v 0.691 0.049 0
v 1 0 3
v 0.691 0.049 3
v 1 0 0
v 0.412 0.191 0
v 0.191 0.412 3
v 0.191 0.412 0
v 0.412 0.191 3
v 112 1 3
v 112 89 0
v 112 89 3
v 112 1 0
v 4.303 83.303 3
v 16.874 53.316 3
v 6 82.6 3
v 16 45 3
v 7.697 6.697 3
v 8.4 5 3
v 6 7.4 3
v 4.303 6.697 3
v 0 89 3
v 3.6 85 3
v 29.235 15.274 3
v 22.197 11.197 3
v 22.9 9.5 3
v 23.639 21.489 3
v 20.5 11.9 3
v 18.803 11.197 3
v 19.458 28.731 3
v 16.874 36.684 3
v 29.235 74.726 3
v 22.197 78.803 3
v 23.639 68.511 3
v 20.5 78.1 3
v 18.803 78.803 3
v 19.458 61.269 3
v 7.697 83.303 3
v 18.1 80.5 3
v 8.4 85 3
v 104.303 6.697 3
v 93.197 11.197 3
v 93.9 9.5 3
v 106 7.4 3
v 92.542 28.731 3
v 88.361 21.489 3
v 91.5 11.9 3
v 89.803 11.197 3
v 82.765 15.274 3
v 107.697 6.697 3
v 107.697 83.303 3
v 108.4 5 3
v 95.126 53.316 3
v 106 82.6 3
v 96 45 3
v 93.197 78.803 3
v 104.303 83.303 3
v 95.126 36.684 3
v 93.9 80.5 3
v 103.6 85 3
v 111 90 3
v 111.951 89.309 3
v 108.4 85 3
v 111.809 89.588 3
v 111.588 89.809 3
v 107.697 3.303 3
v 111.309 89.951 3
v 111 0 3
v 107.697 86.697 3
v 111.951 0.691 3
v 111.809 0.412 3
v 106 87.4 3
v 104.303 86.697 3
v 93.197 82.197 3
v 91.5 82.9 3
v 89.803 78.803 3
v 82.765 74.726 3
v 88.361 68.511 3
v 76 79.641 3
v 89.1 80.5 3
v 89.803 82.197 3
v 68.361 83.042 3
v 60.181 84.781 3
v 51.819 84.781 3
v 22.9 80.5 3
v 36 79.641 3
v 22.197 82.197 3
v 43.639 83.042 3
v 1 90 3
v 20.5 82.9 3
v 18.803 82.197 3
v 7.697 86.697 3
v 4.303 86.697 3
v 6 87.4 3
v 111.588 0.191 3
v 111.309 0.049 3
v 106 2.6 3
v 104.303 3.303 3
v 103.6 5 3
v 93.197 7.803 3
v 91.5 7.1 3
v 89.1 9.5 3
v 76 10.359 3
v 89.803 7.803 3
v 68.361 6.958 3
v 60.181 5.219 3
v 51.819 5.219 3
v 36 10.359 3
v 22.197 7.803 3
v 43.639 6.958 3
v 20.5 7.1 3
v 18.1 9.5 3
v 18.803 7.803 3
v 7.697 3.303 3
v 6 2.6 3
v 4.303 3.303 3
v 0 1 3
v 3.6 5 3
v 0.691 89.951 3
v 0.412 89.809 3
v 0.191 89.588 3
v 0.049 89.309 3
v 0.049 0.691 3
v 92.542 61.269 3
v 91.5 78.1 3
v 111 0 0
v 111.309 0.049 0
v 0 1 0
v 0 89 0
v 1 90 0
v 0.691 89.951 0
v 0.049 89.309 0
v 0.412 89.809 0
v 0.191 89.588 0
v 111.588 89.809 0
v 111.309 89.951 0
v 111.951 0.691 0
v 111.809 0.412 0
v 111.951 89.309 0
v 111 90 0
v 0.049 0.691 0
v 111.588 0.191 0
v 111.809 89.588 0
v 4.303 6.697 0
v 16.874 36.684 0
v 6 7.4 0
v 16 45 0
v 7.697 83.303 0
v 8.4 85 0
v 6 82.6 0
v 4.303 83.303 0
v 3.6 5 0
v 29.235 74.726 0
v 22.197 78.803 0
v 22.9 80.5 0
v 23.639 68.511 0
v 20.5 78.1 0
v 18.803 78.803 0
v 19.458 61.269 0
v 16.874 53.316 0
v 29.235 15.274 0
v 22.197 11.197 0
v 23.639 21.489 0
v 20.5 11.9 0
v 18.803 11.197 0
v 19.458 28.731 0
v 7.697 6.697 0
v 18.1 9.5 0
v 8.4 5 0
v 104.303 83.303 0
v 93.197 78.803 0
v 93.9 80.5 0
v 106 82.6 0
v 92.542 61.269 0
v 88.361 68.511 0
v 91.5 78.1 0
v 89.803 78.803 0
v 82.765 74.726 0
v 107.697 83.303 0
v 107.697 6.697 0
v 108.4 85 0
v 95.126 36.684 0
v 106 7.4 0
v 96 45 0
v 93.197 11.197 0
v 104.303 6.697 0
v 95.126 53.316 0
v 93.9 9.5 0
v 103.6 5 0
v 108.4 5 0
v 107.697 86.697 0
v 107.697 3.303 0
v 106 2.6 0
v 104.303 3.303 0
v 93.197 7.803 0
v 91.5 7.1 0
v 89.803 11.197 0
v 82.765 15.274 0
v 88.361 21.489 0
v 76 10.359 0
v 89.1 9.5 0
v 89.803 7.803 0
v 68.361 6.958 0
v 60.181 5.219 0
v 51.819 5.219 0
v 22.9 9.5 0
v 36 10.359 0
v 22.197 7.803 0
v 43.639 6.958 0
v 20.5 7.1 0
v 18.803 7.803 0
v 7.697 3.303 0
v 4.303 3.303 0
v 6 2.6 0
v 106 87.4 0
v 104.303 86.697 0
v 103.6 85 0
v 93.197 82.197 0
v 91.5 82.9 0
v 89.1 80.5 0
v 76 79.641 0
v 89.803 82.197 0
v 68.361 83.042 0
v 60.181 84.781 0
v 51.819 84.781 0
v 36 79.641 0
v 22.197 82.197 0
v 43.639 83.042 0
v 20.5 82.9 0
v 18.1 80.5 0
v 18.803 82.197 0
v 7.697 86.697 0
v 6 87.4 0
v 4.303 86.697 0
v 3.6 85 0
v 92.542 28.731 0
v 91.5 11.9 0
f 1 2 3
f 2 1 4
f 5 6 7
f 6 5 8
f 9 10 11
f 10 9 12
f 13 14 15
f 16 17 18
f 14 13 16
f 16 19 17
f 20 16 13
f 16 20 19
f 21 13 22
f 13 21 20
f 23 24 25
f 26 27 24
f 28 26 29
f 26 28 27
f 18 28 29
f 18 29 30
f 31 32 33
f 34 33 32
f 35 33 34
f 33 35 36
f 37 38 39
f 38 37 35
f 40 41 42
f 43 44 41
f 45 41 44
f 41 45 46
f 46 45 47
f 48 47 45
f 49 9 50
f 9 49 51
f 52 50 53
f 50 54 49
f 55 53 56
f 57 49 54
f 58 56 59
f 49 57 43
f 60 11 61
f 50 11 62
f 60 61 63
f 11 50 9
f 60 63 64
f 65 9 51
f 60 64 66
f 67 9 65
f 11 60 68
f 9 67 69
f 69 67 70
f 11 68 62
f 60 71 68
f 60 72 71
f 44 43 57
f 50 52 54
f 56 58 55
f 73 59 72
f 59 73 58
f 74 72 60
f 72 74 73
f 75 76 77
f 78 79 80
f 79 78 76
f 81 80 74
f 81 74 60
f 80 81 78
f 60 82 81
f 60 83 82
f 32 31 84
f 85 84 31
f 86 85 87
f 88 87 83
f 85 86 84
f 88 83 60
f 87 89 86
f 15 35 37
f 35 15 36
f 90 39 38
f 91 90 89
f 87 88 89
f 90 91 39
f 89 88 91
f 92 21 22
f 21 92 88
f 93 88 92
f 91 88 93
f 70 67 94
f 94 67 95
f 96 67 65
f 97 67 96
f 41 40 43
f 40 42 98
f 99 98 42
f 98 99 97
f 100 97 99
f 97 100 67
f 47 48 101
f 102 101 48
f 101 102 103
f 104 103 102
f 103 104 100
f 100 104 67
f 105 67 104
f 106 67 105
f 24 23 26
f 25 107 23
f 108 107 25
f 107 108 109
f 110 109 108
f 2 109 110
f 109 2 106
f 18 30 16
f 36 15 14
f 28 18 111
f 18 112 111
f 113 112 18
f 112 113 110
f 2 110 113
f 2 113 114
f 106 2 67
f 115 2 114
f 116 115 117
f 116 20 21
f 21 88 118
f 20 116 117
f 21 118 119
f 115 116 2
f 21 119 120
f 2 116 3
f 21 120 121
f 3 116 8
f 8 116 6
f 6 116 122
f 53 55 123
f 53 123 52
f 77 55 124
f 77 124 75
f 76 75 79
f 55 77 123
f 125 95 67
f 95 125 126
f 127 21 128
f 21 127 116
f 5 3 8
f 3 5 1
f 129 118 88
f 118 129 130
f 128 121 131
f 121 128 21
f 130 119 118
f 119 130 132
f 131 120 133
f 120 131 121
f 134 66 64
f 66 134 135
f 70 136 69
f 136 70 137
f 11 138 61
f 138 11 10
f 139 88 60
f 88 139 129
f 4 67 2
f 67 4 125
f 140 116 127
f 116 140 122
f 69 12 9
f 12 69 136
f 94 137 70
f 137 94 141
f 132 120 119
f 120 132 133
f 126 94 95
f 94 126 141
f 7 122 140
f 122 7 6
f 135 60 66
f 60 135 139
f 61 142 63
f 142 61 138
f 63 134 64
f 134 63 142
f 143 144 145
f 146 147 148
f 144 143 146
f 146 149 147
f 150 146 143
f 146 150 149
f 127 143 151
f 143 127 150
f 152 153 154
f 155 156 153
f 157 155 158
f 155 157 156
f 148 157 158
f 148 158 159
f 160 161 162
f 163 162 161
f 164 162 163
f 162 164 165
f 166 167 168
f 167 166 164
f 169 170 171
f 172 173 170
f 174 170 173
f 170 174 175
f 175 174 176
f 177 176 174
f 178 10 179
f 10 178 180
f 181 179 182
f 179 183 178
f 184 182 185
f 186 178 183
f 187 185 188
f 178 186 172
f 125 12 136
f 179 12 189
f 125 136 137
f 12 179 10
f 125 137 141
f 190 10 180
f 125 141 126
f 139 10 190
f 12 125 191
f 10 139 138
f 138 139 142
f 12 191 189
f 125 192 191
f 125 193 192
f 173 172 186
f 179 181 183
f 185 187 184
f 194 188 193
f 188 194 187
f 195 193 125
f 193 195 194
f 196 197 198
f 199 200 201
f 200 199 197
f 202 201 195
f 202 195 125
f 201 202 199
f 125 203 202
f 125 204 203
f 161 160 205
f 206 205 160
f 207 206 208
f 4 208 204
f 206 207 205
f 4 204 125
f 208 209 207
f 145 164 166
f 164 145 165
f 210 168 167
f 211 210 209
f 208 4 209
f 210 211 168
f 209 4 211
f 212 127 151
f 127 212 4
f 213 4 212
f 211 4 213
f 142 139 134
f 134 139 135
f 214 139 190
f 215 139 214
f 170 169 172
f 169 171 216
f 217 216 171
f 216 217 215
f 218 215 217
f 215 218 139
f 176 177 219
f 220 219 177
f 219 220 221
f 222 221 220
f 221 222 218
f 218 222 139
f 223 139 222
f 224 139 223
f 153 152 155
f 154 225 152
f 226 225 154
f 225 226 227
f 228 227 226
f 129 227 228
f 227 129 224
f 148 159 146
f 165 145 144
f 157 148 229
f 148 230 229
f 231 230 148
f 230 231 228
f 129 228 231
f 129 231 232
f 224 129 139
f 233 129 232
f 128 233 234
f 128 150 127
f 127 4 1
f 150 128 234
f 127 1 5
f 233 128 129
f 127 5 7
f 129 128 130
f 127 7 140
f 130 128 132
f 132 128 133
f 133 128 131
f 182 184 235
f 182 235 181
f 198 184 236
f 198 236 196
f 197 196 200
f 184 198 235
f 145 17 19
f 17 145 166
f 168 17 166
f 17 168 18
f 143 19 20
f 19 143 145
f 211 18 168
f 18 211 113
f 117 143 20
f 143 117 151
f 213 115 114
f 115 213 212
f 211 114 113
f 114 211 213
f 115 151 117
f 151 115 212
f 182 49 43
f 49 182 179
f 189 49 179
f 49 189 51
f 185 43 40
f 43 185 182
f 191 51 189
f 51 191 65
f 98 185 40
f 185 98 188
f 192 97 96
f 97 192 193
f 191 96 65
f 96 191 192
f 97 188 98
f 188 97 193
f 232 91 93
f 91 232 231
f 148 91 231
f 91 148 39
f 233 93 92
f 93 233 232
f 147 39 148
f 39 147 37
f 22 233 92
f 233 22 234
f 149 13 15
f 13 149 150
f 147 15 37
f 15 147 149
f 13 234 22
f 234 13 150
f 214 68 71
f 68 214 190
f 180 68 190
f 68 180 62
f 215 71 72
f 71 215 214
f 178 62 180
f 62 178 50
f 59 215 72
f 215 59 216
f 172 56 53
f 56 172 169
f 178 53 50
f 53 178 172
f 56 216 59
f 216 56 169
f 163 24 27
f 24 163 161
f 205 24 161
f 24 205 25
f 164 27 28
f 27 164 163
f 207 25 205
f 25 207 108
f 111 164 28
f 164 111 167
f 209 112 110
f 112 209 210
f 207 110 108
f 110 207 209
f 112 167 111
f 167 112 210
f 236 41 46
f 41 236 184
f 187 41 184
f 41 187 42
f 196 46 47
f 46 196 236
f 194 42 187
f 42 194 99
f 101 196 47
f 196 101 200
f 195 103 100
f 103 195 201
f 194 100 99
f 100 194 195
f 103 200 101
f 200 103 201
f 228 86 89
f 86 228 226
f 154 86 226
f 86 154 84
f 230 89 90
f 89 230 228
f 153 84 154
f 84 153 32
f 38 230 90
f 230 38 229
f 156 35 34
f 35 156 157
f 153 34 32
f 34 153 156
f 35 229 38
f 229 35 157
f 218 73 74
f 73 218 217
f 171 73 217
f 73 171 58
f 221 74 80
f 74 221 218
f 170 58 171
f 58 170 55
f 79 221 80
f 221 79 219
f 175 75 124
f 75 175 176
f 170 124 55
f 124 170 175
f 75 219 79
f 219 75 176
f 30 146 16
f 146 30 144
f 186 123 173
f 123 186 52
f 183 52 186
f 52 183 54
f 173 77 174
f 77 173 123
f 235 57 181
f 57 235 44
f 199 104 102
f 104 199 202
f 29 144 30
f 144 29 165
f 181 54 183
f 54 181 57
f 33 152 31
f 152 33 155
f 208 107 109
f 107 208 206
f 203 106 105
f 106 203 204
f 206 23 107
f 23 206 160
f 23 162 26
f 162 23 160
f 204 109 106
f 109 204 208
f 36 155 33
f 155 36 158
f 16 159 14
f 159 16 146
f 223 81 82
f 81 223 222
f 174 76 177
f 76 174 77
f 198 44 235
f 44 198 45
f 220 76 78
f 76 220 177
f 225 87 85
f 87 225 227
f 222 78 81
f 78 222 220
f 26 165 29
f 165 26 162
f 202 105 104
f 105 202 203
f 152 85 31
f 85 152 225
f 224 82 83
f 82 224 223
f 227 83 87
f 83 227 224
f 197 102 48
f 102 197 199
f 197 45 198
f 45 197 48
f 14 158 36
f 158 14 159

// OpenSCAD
// file: roundedcube.scad
// Higher definition curves
$fn = 20;



module roundedcube(size = [1, 1, 1], center = false, radius = 0.5, apply_to = "all") {
	// If single value, convert to [x, y, z] vector
	size = (size[0] == undef) ? [size, size, size] : size;

	translate_min = radius;
	translate_xmax = size[0] - radius;
	translate_ymax = size[1] - radius;
	translate_zmax = size[2] - radius;

	diameter = radius * 2;

	module build_point(type = "sphere", rotate = [0, 0, 0]) {
		if (type == "sphere") {
			sphere(r = radius);
		} else if (type == "cylinder") {
			rotate(a = rotate)
			cylinder(h = diameter, r = radius, center = true);
		}
	}

	obj_translate = (center == false) ?
		[0, 0, 0] : [
			-(size[0] / 2),
			-(size[1] / 2),
			-(size[2] / 2)
		];

	translate(v = obj_translate) {
		hull() {
			for (translate_x = [translate_min, translate_xmax]) {
				x_at = (translate_x == translate_min) ? "min" : "max";
				for (translate_y = [translate_min, translate_ymax]) {
					y_at = (translate_y == translate_min) ? "min" : "max";
					for (translate_z = [translate_min, translate_zmax]) {
						z_at = (translate_z == translate_min) ? "min" : "max";

						translate(v = [translate_x, translate_y, translate_z])
						if (
							(apply_to == "all") ||
							(apply_to == "xmin" && x_at == "min") || (apply_to == "xmax" && x_at == "max") ||
							(apply_to == "ymin" && y_at == "min") || (apply_to == "ymax" && y_at == "max") ||
							(apply_to == "zmin" && z_at == "min") || (apply_to == "zmax" && z_at == "max")
						) {
							build_point("sphere");
						} else {
							rotate = 
								(apply_to == "xmin" || apply_to == "xmax" || apply_to == "x") ? [0, 90, 0] : (
								(apply_to == "ymin" || apply_to == "ymax" || apply_to == "y") ? [90, 90, 0] :
								[0, 0, 0]
							);
							build_point("cylinder", rotate);
						}
					}
				}
			}
		}
	}
}
// main file
w = 112;
h = 90;
s = 3;

use <roundedcube.scad>

hmx = 100;
hmy = 80;

fm = 71;
fmh = 80;

hr = 2.4;

difference(){
roundedcube([w,h,s],radius=1,apply_to="z_max");


dx = (w-hmx)/2;
dy = (h-hmy)/2;
translate([dx,dy,0])cylinder(s,hr,hr);
translate([w-dx,dy,0])cylinder(s,hr,hr);
translate([dx,h-dy,0])cylinder(s,hr,hr);
translate([w-dx,h-dy,0])cylinder(s,hr,hr);
    
dfx = (w-fm)/2;
dfy = (h-fm)/2;
translate([dfx,dfy,0])cylinder(s,hr,hr);
translate([w-dfx,dfy,0])cylinder(s,hr,hr);
translate([dfx,h-dfy,0])cylinder(s,hr,hr);
translate([w-dfx,h-dfy,0])cylinder(s,hr,hr);
    
translate([w/2,h/2,0])cylinder(s,fmh/2,fmh/2);
}
